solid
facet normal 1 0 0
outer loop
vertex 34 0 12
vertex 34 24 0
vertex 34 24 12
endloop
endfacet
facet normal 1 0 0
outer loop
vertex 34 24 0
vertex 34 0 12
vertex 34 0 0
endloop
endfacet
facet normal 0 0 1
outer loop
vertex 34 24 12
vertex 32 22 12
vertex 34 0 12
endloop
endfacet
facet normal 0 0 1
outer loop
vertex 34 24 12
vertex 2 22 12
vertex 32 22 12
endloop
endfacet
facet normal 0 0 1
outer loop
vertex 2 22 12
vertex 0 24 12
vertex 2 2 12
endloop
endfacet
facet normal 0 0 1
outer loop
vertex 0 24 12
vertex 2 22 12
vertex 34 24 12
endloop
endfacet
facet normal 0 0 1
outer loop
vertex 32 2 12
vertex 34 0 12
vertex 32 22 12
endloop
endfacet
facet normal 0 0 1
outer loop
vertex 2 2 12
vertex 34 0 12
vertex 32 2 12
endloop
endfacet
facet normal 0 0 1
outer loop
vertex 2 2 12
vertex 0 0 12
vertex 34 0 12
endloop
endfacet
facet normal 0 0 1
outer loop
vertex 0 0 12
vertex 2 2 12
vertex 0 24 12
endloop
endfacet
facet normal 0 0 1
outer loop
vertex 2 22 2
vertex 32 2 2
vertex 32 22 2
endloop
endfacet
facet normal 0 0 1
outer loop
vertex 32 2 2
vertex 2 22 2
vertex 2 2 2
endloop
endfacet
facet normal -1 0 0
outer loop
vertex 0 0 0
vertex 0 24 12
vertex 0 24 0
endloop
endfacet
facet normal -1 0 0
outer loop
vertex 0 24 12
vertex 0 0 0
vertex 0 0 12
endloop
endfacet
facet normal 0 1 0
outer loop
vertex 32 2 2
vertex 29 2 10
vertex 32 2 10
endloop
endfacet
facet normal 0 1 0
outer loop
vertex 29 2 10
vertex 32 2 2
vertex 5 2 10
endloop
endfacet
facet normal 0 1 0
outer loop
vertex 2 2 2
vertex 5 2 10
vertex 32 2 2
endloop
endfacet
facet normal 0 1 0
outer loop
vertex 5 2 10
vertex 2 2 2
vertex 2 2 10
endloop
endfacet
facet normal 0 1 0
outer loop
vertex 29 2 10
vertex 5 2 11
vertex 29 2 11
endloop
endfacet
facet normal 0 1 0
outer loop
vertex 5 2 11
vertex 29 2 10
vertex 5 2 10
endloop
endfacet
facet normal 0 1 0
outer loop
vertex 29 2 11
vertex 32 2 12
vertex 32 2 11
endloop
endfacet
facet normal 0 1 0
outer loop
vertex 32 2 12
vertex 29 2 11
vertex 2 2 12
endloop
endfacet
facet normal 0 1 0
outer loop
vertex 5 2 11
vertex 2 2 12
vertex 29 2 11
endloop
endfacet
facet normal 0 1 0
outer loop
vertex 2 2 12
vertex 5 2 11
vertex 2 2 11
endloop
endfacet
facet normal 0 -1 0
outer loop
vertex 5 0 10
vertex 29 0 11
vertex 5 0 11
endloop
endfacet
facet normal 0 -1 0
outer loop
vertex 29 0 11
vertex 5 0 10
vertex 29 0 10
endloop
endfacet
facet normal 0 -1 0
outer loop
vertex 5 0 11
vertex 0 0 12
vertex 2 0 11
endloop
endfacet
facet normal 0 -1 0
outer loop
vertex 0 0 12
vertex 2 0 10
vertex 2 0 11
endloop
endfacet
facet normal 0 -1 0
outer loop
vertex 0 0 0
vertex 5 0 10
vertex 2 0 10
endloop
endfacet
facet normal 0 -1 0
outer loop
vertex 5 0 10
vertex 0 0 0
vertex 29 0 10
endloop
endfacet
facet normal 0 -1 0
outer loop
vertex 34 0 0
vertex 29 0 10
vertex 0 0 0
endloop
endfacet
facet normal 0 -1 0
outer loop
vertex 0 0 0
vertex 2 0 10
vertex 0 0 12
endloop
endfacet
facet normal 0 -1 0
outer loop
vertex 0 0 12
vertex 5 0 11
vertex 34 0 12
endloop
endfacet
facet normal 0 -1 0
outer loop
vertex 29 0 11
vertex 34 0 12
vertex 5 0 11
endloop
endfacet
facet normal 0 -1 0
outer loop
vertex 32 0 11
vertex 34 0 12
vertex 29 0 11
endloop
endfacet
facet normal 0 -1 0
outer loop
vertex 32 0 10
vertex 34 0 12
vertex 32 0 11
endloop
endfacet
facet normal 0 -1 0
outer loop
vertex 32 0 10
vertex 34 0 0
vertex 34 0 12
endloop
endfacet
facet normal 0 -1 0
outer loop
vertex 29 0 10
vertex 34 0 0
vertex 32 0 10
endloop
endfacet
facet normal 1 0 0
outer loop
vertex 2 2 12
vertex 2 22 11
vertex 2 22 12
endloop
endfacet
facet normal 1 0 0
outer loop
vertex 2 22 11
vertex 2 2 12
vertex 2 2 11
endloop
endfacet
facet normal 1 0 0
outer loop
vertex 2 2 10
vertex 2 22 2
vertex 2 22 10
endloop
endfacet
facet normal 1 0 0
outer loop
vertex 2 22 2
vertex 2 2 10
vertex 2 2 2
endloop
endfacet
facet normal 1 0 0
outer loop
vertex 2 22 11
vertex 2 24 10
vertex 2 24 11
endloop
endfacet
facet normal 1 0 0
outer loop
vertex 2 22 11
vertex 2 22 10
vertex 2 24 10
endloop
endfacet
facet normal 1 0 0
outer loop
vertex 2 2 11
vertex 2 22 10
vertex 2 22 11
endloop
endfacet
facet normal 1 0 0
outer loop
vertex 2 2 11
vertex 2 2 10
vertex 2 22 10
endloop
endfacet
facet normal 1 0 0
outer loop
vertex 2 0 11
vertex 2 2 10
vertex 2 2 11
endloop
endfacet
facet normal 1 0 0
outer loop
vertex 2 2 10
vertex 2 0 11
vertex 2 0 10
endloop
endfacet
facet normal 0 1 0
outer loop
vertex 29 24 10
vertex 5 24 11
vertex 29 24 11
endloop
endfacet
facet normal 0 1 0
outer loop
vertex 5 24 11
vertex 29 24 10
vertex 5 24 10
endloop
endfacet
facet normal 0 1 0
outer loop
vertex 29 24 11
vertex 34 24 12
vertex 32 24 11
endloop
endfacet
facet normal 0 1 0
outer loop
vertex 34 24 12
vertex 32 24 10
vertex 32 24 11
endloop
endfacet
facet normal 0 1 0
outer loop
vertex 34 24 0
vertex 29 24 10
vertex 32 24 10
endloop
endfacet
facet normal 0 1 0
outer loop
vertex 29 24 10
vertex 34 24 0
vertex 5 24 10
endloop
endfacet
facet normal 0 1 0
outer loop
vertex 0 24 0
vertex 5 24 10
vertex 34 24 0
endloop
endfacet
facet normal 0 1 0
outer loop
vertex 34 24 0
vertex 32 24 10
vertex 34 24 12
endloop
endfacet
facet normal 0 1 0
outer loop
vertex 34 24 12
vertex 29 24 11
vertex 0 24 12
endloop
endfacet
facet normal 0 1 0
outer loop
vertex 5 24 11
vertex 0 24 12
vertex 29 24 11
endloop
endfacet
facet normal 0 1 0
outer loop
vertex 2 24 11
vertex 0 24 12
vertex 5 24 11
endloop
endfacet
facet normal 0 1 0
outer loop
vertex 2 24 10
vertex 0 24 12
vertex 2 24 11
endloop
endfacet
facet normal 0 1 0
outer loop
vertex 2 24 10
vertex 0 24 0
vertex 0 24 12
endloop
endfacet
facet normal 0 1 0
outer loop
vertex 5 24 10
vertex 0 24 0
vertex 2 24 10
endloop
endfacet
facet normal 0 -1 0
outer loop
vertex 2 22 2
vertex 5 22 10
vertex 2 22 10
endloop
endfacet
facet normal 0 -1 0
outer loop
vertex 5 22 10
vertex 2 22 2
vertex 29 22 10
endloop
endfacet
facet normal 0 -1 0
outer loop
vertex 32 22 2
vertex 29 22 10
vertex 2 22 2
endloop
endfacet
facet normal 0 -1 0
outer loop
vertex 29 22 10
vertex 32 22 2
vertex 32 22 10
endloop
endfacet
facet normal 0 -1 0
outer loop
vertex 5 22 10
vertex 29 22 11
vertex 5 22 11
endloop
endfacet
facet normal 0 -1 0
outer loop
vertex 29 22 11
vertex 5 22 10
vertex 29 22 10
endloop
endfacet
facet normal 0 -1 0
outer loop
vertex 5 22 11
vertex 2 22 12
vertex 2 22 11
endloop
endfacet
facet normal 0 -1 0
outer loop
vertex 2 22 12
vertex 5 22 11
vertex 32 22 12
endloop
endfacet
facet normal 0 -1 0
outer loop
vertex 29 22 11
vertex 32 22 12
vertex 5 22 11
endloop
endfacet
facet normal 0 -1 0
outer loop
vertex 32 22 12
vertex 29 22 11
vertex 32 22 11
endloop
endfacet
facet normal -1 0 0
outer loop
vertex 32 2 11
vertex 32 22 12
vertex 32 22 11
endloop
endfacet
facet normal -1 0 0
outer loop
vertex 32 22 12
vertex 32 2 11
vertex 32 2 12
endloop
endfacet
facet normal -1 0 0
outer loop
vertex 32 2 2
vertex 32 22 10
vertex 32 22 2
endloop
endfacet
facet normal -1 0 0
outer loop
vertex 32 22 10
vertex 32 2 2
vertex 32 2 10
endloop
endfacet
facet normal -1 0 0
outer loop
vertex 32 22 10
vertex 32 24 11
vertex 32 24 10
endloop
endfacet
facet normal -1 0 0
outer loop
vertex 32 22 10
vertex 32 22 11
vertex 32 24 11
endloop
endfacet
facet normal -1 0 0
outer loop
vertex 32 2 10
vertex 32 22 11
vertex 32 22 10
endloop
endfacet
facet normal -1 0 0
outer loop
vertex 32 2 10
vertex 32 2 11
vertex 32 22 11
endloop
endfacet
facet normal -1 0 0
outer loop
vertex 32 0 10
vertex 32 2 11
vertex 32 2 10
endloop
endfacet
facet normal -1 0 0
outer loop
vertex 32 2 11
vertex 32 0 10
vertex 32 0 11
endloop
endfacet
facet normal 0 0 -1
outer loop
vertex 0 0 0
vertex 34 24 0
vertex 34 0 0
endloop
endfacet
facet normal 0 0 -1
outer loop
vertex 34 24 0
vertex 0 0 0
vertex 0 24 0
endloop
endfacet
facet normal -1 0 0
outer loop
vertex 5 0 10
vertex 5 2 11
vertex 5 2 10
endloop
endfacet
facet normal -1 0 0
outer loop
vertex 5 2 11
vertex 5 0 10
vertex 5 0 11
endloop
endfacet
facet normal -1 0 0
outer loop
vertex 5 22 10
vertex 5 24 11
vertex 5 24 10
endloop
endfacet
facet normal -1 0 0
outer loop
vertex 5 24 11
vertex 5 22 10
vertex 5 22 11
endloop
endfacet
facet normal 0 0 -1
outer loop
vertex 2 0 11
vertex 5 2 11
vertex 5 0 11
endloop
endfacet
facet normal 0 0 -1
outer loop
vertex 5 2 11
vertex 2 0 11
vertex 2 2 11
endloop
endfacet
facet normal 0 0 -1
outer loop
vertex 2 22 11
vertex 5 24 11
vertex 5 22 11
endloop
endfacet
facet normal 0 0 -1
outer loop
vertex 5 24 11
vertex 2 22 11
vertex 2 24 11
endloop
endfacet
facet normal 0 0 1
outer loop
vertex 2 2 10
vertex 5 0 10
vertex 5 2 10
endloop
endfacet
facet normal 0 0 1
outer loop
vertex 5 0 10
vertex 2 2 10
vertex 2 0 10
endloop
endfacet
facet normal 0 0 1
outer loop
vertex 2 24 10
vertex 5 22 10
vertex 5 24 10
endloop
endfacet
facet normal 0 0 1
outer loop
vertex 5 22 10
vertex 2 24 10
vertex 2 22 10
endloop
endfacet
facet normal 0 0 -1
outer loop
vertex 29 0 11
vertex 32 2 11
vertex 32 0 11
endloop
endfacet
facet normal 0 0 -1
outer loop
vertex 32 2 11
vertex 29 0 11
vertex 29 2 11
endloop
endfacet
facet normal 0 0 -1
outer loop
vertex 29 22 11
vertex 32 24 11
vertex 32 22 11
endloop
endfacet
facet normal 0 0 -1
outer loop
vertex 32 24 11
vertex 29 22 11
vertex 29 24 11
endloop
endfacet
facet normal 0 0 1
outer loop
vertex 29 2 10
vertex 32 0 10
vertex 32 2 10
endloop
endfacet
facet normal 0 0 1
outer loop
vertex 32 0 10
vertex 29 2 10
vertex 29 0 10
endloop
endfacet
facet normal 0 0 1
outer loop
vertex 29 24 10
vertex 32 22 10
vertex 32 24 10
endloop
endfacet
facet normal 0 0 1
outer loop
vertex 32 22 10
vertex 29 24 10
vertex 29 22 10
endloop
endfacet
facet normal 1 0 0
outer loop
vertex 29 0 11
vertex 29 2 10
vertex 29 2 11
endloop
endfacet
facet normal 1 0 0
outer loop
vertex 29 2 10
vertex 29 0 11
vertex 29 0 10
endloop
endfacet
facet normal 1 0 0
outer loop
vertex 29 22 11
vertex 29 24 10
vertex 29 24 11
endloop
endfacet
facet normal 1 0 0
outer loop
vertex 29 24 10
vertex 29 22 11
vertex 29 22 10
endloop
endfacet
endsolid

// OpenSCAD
$width = 30;
$depth = 20;
$height = 10;
$floor = 2;
$thickness = 2;
$tie_height = 8;
$tie_width = 3;

$outer_width = $width + $thickness*2;
$outer_depth = $depth + $thickness*2;

difference() {

group() {
translate([0,0,$floor]) {
// 1st x wall
cube([$outer_width,$thickness,$height]);

// 1st y wall
cube([$thickness,$outer_depth,$height]);

// 2nd x wall
translate([0,$depth+$thickness,0])
cube([$outer_width,$thickness,$height]);

// 2nd y wall
translate([$width+$thickness,0,0])
cube([$thickness,$outer_depth,$height]);
}

// floor
cube([$outer_width,$outer_depth, $floor]);
}

translate([0,0,$floor+$tie_height]) {
translate([$thickness,-1,0])
cube([$tie_width,$outer_depth+2,1]);
    
translate([$outer_width-$thickness-$tie_width,-1,0])
cube([$tie_width,$outer_depth+2,1]);
}
}
